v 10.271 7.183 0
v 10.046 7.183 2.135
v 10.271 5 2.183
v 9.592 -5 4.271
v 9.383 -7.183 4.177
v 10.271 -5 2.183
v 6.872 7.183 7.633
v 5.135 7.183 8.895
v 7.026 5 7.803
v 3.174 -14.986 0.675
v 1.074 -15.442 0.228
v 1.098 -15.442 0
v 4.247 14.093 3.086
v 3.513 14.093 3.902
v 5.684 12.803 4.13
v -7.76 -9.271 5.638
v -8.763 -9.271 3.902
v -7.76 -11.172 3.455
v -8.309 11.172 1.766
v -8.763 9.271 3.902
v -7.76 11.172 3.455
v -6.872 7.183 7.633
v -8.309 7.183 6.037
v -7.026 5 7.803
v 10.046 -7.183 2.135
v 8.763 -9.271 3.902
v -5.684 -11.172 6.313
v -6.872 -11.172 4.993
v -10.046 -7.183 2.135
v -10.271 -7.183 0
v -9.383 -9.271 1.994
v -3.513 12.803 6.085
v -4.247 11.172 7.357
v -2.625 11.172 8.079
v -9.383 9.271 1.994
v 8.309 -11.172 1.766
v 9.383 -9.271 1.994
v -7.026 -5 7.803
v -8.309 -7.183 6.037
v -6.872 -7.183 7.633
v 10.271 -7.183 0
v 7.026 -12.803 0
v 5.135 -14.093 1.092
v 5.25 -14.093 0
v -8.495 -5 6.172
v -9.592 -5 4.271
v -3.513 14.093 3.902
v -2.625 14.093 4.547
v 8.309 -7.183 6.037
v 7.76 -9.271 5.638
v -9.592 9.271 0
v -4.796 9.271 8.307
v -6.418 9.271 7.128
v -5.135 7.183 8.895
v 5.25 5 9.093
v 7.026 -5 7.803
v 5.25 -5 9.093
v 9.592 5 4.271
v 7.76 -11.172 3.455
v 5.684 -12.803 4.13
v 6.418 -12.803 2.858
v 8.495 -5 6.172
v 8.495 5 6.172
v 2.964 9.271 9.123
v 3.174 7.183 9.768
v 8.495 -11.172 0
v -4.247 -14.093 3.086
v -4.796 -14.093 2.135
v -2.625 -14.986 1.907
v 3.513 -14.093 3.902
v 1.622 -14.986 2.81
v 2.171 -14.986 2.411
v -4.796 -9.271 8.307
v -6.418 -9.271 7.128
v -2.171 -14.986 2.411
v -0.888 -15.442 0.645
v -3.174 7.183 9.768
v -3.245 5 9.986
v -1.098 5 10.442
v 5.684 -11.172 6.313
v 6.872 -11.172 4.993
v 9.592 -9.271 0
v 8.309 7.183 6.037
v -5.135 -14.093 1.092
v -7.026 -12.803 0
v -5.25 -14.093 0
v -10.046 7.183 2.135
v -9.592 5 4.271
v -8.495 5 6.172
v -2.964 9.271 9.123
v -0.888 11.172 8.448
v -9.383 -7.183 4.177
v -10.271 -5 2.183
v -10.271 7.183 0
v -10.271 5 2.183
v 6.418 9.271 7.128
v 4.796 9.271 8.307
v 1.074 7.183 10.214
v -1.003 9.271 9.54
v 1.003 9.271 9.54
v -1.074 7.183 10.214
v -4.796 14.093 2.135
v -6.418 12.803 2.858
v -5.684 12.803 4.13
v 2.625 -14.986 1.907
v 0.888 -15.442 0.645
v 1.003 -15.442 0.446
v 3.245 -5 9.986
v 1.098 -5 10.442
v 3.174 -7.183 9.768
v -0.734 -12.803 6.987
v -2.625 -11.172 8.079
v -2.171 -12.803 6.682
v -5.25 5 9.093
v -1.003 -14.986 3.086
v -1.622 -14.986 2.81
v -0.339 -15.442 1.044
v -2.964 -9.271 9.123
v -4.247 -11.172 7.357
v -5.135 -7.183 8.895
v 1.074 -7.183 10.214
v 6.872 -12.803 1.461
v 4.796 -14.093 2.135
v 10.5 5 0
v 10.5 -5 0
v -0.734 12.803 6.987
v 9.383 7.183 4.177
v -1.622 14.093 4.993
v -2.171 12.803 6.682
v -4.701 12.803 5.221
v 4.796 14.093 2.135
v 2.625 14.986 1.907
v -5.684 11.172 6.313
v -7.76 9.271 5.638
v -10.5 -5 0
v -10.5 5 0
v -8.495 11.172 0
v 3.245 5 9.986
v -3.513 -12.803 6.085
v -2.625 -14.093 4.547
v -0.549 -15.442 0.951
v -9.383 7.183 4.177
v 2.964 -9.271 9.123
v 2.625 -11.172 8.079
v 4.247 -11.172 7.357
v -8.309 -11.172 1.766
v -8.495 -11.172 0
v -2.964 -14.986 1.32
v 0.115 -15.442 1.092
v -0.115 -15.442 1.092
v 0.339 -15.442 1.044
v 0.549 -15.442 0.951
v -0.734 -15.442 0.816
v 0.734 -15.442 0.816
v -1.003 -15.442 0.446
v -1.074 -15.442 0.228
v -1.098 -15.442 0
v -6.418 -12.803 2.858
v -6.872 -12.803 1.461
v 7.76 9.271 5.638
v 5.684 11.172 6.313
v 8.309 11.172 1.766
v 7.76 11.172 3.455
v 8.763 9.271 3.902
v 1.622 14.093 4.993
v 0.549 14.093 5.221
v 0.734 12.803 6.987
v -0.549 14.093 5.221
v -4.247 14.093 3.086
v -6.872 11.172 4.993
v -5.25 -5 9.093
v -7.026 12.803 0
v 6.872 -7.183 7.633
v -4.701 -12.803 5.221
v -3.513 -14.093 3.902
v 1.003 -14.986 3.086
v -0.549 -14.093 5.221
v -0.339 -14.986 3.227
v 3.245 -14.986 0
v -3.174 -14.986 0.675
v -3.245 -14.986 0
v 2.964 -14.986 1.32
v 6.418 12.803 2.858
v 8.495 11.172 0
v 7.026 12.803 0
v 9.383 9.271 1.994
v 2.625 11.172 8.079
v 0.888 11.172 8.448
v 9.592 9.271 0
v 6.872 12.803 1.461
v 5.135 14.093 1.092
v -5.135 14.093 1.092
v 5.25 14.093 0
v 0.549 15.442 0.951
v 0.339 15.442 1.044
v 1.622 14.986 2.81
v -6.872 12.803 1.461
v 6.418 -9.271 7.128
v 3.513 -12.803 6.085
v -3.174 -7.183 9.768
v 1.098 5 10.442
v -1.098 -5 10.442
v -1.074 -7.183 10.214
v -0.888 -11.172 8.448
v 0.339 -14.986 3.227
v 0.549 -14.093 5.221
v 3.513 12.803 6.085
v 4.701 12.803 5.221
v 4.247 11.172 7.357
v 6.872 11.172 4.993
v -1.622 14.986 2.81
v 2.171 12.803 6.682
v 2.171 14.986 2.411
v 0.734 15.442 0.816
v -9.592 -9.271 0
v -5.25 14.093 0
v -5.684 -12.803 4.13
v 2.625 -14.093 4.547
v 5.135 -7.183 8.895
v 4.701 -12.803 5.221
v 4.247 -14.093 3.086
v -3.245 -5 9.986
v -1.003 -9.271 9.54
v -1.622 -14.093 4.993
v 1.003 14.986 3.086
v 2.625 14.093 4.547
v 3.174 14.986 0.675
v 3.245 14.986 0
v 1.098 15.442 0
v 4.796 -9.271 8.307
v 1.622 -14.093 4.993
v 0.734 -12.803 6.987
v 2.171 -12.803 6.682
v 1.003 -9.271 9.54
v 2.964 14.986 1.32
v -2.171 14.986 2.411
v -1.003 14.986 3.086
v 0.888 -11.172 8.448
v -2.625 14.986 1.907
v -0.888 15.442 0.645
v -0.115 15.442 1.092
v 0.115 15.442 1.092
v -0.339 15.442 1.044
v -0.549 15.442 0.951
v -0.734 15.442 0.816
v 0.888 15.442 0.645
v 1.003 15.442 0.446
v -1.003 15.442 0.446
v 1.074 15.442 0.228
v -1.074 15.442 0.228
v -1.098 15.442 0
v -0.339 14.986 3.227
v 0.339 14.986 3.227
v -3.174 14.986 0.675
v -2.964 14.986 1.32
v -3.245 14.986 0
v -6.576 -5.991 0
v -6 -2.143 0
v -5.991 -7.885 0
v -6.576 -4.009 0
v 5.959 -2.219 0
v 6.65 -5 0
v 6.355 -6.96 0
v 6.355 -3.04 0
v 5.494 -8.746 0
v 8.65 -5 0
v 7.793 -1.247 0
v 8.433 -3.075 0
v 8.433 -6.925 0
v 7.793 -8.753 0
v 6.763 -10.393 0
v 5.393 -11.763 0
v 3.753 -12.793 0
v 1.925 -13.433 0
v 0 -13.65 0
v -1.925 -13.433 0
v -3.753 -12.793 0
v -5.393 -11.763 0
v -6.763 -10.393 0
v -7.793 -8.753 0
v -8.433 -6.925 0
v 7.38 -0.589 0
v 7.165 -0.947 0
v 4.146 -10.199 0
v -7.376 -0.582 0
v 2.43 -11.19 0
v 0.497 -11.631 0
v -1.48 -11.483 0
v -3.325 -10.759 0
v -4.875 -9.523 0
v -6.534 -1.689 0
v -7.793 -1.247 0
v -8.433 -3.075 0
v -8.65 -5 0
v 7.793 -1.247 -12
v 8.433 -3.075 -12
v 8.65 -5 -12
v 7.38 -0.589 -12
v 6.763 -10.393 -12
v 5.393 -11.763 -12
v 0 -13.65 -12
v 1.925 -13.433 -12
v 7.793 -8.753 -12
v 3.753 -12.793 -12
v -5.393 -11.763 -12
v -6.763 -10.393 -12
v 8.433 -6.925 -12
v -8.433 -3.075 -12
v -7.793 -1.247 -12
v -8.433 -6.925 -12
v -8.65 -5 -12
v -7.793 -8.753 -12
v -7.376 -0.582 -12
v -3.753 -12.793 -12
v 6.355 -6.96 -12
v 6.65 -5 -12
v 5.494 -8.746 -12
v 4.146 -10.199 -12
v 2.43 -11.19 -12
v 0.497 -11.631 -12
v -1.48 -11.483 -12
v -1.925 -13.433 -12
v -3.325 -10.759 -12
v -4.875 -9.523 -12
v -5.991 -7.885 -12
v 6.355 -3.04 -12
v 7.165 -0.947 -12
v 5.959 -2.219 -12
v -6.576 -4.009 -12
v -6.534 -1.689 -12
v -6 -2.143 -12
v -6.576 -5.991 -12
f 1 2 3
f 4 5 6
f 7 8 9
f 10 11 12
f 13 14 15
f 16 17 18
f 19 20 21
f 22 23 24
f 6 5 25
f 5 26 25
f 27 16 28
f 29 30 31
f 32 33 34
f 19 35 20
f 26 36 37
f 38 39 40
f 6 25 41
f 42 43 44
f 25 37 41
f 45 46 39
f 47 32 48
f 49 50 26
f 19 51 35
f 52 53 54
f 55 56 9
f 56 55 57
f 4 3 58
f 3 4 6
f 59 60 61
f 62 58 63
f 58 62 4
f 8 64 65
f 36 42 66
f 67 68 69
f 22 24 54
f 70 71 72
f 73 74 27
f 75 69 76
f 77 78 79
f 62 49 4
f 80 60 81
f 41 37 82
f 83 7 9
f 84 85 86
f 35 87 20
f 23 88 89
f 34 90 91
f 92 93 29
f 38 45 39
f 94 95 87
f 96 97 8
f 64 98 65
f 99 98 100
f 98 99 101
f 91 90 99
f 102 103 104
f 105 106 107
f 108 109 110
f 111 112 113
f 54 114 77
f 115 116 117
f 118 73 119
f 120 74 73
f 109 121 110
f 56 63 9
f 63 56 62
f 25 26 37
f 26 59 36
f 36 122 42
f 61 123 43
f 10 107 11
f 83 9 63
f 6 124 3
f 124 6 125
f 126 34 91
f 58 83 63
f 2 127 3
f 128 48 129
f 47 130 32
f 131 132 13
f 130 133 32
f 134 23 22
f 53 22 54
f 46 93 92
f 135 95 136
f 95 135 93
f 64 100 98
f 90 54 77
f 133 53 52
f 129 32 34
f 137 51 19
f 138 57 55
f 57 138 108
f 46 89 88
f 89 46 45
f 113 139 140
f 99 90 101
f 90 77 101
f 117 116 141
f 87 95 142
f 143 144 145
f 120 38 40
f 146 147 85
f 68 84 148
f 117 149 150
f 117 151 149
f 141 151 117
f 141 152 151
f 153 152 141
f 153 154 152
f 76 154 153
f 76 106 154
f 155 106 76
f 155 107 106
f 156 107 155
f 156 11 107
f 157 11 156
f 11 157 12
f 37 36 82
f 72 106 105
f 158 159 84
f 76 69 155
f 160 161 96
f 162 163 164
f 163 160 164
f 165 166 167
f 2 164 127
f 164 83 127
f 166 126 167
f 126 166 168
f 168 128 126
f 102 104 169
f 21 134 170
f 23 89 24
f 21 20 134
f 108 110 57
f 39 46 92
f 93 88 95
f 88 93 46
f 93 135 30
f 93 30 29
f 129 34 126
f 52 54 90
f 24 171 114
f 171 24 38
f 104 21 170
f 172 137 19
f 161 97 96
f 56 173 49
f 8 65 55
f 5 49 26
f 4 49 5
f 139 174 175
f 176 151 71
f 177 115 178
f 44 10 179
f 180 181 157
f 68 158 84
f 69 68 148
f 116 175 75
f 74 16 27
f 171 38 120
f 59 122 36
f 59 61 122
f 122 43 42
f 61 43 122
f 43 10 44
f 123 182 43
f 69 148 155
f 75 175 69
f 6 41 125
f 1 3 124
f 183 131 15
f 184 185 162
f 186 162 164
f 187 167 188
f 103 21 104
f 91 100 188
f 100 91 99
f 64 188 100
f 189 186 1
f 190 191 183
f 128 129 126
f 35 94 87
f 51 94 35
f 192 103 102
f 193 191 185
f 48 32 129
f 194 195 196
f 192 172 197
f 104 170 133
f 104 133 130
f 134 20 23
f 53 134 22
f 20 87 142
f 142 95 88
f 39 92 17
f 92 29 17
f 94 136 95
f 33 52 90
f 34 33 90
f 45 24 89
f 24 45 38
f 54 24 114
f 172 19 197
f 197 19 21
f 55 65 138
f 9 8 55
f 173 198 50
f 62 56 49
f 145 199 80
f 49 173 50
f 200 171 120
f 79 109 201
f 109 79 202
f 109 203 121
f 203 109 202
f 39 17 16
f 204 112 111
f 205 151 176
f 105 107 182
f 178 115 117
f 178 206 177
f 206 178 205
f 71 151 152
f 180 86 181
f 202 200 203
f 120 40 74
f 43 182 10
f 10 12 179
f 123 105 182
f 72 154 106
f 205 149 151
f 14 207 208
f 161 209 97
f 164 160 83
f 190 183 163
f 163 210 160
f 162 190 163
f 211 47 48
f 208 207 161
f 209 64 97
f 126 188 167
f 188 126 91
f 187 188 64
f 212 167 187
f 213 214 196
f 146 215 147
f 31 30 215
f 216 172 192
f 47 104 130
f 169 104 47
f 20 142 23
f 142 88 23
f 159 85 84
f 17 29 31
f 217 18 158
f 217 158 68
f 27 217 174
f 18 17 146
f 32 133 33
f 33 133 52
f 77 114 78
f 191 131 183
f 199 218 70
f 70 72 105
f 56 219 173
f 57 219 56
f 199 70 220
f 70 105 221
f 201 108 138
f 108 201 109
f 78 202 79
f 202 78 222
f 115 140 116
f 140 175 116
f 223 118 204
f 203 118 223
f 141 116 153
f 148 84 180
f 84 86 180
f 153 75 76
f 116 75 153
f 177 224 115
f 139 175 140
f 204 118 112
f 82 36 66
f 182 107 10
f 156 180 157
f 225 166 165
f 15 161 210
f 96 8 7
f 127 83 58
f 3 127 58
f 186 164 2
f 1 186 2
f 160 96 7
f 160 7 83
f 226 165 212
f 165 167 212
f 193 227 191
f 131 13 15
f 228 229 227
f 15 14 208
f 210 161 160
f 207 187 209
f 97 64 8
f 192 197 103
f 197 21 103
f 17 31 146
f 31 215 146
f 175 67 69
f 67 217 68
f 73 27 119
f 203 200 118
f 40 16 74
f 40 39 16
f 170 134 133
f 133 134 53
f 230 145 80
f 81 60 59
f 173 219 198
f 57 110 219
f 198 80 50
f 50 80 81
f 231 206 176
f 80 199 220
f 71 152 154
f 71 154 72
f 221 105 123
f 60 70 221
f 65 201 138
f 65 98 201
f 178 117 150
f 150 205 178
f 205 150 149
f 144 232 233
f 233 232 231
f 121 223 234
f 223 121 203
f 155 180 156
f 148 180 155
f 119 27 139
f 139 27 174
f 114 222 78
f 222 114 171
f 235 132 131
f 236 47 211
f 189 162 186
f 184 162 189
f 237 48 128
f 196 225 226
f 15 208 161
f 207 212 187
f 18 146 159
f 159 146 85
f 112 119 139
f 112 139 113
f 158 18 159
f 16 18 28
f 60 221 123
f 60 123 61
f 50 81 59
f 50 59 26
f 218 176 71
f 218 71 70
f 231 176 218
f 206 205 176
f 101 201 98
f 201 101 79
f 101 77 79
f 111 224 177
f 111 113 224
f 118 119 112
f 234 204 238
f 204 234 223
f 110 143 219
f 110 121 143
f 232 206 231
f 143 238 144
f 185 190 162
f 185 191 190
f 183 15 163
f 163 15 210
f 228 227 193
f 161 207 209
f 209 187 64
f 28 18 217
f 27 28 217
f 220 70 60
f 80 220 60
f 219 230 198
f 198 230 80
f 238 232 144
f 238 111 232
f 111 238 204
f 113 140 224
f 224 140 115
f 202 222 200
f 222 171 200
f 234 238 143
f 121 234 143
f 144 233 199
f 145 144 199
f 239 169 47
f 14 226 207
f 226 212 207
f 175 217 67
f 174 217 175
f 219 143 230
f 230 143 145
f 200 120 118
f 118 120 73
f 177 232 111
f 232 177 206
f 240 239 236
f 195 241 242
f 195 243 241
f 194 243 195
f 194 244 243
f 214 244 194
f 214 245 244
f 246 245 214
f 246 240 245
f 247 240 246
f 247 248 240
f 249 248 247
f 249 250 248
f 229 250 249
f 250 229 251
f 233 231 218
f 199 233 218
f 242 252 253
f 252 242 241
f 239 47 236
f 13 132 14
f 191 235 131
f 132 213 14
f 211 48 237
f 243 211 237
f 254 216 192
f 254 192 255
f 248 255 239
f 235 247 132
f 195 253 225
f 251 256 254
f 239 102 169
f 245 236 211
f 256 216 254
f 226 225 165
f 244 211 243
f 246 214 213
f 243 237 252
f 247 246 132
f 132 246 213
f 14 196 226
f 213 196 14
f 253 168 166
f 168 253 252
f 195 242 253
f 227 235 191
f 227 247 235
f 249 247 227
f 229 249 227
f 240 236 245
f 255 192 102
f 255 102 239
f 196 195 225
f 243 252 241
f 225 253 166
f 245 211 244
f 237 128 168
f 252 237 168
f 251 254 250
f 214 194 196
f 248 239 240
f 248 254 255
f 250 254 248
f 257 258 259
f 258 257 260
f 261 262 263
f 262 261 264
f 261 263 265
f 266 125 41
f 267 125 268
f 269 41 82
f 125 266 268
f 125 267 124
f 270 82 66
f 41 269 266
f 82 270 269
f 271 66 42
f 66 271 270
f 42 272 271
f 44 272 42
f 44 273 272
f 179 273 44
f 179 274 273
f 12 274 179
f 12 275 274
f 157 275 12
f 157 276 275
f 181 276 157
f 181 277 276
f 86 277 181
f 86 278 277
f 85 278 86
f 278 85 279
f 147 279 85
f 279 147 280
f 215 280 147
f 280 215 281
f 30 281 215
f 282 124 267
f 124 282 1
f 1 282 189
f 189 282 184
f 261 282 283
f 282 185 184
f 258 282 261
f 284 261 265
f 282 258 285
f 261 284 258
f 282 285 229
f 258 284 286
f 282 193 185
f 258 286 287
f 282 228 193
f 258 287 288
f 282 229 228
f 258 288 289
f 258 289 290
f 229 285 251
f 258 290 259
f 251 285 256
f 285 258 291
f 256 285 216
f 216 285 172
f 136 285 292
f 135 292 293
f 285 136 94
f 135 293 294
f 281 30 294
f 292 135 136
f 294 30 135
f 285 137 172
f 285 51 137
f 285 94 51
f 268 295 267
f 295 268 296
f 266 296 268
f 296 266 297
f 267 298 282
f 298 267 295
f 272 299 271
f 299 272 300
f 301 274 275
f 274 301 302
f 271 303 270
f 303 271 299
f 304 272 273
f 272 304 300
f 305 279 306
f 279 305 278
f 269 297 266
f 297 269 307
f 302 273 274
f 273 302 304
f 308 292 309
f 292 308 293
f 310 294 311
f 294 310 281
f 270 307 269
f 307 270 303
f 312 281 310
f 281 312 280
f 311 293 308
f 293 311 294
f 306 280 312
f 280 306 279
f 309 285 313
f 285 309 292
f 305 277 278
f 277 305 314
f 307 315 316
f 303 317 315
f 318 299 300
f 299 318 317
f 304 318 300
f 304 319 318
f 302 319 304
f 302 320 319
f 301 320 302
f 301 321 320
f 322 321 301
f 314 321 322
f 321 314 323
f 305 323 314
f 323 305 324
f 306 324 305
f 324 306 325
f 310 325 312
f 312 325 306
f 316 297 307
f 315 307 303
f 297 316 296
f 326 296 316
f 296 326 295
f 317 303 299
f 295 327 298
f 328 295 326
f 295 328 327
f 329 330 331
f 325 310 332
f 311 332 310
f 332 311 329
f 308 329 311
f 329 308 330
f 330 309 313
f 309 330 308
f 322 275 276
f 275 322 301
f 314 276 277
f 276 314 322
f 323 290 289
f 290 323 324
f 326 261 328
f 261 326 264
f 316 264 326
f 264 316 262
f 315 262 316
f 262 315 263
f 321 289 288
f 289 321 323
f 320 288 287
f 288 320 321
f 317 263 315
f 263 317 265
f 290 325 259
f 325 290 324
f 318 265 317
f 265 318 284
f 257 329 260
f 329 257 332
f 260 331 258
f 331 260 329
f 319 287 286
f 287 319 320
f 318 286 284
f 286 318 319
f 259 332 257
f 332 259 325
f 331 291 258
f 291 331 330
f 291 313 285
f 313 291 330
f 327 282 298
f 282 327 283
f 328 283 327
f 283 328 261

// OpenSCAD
// file: Pill.scad
/* Pill Object, Loic August 2017 */

//pill(200,10);

module pill(height,width)
{
       move = (height - width) / 2;
       cyl_height = height - width;
       cyl_move = -move;
    
    hull()
    {
        translate([0,0,-move]) 
            sphere(width/2);

        translate([0,0,move]) 
            sphere(width/2);
    }
}
// main file
diam = 20.5;

/*
translate([0,0,-20.5])
{
union()
{
bulb();

translate([-3,0,-7]) 
difference()
{
foot(30);
translate([3,0,-5])     
foot(22);
}
}
}
*/

use <Pill.scad>


difference()
{
rotate([90,0,0])
    pill(31,21);

translate([0,0,-15.25])
    cube([40,40,30.5],true);
}


difference()
{
translate([0,-5,-12])
    cylinder(12,8.65,8.65);

translate([0,-5,-16])
    cylinder(16,6.65,6.65);
    
translate([0,4.5,-16])
    cylinder(16,9,9);
}


module foot(size)
{
difference()
{
union()
{
translate([size/3,0,-size/3]) 
    sphere(size/2);

translate([size/3,0,-size/5]) 
    sphere(size/2);

translate([size/3,0,-size/15]) 
    sphere(size/2);

translate([size/3,0,size/15]) 
    sphere(size/2);

translate([size/3,0,size/5]) 
    sphere(size/2);

translate([size/3,0,size/3]) 
    sphere(size/2);

cube([size/15*10,size,size/15*12],true);
}

translate([0,0,-size/15*21]) 
    cube([size*2,size*2,size*2],true);

translate([0,0,size/15*21]) 
    cube([size*2,size*2,size*2],true);

translate([-size,0,0]) 
sphere(size);
}
}
